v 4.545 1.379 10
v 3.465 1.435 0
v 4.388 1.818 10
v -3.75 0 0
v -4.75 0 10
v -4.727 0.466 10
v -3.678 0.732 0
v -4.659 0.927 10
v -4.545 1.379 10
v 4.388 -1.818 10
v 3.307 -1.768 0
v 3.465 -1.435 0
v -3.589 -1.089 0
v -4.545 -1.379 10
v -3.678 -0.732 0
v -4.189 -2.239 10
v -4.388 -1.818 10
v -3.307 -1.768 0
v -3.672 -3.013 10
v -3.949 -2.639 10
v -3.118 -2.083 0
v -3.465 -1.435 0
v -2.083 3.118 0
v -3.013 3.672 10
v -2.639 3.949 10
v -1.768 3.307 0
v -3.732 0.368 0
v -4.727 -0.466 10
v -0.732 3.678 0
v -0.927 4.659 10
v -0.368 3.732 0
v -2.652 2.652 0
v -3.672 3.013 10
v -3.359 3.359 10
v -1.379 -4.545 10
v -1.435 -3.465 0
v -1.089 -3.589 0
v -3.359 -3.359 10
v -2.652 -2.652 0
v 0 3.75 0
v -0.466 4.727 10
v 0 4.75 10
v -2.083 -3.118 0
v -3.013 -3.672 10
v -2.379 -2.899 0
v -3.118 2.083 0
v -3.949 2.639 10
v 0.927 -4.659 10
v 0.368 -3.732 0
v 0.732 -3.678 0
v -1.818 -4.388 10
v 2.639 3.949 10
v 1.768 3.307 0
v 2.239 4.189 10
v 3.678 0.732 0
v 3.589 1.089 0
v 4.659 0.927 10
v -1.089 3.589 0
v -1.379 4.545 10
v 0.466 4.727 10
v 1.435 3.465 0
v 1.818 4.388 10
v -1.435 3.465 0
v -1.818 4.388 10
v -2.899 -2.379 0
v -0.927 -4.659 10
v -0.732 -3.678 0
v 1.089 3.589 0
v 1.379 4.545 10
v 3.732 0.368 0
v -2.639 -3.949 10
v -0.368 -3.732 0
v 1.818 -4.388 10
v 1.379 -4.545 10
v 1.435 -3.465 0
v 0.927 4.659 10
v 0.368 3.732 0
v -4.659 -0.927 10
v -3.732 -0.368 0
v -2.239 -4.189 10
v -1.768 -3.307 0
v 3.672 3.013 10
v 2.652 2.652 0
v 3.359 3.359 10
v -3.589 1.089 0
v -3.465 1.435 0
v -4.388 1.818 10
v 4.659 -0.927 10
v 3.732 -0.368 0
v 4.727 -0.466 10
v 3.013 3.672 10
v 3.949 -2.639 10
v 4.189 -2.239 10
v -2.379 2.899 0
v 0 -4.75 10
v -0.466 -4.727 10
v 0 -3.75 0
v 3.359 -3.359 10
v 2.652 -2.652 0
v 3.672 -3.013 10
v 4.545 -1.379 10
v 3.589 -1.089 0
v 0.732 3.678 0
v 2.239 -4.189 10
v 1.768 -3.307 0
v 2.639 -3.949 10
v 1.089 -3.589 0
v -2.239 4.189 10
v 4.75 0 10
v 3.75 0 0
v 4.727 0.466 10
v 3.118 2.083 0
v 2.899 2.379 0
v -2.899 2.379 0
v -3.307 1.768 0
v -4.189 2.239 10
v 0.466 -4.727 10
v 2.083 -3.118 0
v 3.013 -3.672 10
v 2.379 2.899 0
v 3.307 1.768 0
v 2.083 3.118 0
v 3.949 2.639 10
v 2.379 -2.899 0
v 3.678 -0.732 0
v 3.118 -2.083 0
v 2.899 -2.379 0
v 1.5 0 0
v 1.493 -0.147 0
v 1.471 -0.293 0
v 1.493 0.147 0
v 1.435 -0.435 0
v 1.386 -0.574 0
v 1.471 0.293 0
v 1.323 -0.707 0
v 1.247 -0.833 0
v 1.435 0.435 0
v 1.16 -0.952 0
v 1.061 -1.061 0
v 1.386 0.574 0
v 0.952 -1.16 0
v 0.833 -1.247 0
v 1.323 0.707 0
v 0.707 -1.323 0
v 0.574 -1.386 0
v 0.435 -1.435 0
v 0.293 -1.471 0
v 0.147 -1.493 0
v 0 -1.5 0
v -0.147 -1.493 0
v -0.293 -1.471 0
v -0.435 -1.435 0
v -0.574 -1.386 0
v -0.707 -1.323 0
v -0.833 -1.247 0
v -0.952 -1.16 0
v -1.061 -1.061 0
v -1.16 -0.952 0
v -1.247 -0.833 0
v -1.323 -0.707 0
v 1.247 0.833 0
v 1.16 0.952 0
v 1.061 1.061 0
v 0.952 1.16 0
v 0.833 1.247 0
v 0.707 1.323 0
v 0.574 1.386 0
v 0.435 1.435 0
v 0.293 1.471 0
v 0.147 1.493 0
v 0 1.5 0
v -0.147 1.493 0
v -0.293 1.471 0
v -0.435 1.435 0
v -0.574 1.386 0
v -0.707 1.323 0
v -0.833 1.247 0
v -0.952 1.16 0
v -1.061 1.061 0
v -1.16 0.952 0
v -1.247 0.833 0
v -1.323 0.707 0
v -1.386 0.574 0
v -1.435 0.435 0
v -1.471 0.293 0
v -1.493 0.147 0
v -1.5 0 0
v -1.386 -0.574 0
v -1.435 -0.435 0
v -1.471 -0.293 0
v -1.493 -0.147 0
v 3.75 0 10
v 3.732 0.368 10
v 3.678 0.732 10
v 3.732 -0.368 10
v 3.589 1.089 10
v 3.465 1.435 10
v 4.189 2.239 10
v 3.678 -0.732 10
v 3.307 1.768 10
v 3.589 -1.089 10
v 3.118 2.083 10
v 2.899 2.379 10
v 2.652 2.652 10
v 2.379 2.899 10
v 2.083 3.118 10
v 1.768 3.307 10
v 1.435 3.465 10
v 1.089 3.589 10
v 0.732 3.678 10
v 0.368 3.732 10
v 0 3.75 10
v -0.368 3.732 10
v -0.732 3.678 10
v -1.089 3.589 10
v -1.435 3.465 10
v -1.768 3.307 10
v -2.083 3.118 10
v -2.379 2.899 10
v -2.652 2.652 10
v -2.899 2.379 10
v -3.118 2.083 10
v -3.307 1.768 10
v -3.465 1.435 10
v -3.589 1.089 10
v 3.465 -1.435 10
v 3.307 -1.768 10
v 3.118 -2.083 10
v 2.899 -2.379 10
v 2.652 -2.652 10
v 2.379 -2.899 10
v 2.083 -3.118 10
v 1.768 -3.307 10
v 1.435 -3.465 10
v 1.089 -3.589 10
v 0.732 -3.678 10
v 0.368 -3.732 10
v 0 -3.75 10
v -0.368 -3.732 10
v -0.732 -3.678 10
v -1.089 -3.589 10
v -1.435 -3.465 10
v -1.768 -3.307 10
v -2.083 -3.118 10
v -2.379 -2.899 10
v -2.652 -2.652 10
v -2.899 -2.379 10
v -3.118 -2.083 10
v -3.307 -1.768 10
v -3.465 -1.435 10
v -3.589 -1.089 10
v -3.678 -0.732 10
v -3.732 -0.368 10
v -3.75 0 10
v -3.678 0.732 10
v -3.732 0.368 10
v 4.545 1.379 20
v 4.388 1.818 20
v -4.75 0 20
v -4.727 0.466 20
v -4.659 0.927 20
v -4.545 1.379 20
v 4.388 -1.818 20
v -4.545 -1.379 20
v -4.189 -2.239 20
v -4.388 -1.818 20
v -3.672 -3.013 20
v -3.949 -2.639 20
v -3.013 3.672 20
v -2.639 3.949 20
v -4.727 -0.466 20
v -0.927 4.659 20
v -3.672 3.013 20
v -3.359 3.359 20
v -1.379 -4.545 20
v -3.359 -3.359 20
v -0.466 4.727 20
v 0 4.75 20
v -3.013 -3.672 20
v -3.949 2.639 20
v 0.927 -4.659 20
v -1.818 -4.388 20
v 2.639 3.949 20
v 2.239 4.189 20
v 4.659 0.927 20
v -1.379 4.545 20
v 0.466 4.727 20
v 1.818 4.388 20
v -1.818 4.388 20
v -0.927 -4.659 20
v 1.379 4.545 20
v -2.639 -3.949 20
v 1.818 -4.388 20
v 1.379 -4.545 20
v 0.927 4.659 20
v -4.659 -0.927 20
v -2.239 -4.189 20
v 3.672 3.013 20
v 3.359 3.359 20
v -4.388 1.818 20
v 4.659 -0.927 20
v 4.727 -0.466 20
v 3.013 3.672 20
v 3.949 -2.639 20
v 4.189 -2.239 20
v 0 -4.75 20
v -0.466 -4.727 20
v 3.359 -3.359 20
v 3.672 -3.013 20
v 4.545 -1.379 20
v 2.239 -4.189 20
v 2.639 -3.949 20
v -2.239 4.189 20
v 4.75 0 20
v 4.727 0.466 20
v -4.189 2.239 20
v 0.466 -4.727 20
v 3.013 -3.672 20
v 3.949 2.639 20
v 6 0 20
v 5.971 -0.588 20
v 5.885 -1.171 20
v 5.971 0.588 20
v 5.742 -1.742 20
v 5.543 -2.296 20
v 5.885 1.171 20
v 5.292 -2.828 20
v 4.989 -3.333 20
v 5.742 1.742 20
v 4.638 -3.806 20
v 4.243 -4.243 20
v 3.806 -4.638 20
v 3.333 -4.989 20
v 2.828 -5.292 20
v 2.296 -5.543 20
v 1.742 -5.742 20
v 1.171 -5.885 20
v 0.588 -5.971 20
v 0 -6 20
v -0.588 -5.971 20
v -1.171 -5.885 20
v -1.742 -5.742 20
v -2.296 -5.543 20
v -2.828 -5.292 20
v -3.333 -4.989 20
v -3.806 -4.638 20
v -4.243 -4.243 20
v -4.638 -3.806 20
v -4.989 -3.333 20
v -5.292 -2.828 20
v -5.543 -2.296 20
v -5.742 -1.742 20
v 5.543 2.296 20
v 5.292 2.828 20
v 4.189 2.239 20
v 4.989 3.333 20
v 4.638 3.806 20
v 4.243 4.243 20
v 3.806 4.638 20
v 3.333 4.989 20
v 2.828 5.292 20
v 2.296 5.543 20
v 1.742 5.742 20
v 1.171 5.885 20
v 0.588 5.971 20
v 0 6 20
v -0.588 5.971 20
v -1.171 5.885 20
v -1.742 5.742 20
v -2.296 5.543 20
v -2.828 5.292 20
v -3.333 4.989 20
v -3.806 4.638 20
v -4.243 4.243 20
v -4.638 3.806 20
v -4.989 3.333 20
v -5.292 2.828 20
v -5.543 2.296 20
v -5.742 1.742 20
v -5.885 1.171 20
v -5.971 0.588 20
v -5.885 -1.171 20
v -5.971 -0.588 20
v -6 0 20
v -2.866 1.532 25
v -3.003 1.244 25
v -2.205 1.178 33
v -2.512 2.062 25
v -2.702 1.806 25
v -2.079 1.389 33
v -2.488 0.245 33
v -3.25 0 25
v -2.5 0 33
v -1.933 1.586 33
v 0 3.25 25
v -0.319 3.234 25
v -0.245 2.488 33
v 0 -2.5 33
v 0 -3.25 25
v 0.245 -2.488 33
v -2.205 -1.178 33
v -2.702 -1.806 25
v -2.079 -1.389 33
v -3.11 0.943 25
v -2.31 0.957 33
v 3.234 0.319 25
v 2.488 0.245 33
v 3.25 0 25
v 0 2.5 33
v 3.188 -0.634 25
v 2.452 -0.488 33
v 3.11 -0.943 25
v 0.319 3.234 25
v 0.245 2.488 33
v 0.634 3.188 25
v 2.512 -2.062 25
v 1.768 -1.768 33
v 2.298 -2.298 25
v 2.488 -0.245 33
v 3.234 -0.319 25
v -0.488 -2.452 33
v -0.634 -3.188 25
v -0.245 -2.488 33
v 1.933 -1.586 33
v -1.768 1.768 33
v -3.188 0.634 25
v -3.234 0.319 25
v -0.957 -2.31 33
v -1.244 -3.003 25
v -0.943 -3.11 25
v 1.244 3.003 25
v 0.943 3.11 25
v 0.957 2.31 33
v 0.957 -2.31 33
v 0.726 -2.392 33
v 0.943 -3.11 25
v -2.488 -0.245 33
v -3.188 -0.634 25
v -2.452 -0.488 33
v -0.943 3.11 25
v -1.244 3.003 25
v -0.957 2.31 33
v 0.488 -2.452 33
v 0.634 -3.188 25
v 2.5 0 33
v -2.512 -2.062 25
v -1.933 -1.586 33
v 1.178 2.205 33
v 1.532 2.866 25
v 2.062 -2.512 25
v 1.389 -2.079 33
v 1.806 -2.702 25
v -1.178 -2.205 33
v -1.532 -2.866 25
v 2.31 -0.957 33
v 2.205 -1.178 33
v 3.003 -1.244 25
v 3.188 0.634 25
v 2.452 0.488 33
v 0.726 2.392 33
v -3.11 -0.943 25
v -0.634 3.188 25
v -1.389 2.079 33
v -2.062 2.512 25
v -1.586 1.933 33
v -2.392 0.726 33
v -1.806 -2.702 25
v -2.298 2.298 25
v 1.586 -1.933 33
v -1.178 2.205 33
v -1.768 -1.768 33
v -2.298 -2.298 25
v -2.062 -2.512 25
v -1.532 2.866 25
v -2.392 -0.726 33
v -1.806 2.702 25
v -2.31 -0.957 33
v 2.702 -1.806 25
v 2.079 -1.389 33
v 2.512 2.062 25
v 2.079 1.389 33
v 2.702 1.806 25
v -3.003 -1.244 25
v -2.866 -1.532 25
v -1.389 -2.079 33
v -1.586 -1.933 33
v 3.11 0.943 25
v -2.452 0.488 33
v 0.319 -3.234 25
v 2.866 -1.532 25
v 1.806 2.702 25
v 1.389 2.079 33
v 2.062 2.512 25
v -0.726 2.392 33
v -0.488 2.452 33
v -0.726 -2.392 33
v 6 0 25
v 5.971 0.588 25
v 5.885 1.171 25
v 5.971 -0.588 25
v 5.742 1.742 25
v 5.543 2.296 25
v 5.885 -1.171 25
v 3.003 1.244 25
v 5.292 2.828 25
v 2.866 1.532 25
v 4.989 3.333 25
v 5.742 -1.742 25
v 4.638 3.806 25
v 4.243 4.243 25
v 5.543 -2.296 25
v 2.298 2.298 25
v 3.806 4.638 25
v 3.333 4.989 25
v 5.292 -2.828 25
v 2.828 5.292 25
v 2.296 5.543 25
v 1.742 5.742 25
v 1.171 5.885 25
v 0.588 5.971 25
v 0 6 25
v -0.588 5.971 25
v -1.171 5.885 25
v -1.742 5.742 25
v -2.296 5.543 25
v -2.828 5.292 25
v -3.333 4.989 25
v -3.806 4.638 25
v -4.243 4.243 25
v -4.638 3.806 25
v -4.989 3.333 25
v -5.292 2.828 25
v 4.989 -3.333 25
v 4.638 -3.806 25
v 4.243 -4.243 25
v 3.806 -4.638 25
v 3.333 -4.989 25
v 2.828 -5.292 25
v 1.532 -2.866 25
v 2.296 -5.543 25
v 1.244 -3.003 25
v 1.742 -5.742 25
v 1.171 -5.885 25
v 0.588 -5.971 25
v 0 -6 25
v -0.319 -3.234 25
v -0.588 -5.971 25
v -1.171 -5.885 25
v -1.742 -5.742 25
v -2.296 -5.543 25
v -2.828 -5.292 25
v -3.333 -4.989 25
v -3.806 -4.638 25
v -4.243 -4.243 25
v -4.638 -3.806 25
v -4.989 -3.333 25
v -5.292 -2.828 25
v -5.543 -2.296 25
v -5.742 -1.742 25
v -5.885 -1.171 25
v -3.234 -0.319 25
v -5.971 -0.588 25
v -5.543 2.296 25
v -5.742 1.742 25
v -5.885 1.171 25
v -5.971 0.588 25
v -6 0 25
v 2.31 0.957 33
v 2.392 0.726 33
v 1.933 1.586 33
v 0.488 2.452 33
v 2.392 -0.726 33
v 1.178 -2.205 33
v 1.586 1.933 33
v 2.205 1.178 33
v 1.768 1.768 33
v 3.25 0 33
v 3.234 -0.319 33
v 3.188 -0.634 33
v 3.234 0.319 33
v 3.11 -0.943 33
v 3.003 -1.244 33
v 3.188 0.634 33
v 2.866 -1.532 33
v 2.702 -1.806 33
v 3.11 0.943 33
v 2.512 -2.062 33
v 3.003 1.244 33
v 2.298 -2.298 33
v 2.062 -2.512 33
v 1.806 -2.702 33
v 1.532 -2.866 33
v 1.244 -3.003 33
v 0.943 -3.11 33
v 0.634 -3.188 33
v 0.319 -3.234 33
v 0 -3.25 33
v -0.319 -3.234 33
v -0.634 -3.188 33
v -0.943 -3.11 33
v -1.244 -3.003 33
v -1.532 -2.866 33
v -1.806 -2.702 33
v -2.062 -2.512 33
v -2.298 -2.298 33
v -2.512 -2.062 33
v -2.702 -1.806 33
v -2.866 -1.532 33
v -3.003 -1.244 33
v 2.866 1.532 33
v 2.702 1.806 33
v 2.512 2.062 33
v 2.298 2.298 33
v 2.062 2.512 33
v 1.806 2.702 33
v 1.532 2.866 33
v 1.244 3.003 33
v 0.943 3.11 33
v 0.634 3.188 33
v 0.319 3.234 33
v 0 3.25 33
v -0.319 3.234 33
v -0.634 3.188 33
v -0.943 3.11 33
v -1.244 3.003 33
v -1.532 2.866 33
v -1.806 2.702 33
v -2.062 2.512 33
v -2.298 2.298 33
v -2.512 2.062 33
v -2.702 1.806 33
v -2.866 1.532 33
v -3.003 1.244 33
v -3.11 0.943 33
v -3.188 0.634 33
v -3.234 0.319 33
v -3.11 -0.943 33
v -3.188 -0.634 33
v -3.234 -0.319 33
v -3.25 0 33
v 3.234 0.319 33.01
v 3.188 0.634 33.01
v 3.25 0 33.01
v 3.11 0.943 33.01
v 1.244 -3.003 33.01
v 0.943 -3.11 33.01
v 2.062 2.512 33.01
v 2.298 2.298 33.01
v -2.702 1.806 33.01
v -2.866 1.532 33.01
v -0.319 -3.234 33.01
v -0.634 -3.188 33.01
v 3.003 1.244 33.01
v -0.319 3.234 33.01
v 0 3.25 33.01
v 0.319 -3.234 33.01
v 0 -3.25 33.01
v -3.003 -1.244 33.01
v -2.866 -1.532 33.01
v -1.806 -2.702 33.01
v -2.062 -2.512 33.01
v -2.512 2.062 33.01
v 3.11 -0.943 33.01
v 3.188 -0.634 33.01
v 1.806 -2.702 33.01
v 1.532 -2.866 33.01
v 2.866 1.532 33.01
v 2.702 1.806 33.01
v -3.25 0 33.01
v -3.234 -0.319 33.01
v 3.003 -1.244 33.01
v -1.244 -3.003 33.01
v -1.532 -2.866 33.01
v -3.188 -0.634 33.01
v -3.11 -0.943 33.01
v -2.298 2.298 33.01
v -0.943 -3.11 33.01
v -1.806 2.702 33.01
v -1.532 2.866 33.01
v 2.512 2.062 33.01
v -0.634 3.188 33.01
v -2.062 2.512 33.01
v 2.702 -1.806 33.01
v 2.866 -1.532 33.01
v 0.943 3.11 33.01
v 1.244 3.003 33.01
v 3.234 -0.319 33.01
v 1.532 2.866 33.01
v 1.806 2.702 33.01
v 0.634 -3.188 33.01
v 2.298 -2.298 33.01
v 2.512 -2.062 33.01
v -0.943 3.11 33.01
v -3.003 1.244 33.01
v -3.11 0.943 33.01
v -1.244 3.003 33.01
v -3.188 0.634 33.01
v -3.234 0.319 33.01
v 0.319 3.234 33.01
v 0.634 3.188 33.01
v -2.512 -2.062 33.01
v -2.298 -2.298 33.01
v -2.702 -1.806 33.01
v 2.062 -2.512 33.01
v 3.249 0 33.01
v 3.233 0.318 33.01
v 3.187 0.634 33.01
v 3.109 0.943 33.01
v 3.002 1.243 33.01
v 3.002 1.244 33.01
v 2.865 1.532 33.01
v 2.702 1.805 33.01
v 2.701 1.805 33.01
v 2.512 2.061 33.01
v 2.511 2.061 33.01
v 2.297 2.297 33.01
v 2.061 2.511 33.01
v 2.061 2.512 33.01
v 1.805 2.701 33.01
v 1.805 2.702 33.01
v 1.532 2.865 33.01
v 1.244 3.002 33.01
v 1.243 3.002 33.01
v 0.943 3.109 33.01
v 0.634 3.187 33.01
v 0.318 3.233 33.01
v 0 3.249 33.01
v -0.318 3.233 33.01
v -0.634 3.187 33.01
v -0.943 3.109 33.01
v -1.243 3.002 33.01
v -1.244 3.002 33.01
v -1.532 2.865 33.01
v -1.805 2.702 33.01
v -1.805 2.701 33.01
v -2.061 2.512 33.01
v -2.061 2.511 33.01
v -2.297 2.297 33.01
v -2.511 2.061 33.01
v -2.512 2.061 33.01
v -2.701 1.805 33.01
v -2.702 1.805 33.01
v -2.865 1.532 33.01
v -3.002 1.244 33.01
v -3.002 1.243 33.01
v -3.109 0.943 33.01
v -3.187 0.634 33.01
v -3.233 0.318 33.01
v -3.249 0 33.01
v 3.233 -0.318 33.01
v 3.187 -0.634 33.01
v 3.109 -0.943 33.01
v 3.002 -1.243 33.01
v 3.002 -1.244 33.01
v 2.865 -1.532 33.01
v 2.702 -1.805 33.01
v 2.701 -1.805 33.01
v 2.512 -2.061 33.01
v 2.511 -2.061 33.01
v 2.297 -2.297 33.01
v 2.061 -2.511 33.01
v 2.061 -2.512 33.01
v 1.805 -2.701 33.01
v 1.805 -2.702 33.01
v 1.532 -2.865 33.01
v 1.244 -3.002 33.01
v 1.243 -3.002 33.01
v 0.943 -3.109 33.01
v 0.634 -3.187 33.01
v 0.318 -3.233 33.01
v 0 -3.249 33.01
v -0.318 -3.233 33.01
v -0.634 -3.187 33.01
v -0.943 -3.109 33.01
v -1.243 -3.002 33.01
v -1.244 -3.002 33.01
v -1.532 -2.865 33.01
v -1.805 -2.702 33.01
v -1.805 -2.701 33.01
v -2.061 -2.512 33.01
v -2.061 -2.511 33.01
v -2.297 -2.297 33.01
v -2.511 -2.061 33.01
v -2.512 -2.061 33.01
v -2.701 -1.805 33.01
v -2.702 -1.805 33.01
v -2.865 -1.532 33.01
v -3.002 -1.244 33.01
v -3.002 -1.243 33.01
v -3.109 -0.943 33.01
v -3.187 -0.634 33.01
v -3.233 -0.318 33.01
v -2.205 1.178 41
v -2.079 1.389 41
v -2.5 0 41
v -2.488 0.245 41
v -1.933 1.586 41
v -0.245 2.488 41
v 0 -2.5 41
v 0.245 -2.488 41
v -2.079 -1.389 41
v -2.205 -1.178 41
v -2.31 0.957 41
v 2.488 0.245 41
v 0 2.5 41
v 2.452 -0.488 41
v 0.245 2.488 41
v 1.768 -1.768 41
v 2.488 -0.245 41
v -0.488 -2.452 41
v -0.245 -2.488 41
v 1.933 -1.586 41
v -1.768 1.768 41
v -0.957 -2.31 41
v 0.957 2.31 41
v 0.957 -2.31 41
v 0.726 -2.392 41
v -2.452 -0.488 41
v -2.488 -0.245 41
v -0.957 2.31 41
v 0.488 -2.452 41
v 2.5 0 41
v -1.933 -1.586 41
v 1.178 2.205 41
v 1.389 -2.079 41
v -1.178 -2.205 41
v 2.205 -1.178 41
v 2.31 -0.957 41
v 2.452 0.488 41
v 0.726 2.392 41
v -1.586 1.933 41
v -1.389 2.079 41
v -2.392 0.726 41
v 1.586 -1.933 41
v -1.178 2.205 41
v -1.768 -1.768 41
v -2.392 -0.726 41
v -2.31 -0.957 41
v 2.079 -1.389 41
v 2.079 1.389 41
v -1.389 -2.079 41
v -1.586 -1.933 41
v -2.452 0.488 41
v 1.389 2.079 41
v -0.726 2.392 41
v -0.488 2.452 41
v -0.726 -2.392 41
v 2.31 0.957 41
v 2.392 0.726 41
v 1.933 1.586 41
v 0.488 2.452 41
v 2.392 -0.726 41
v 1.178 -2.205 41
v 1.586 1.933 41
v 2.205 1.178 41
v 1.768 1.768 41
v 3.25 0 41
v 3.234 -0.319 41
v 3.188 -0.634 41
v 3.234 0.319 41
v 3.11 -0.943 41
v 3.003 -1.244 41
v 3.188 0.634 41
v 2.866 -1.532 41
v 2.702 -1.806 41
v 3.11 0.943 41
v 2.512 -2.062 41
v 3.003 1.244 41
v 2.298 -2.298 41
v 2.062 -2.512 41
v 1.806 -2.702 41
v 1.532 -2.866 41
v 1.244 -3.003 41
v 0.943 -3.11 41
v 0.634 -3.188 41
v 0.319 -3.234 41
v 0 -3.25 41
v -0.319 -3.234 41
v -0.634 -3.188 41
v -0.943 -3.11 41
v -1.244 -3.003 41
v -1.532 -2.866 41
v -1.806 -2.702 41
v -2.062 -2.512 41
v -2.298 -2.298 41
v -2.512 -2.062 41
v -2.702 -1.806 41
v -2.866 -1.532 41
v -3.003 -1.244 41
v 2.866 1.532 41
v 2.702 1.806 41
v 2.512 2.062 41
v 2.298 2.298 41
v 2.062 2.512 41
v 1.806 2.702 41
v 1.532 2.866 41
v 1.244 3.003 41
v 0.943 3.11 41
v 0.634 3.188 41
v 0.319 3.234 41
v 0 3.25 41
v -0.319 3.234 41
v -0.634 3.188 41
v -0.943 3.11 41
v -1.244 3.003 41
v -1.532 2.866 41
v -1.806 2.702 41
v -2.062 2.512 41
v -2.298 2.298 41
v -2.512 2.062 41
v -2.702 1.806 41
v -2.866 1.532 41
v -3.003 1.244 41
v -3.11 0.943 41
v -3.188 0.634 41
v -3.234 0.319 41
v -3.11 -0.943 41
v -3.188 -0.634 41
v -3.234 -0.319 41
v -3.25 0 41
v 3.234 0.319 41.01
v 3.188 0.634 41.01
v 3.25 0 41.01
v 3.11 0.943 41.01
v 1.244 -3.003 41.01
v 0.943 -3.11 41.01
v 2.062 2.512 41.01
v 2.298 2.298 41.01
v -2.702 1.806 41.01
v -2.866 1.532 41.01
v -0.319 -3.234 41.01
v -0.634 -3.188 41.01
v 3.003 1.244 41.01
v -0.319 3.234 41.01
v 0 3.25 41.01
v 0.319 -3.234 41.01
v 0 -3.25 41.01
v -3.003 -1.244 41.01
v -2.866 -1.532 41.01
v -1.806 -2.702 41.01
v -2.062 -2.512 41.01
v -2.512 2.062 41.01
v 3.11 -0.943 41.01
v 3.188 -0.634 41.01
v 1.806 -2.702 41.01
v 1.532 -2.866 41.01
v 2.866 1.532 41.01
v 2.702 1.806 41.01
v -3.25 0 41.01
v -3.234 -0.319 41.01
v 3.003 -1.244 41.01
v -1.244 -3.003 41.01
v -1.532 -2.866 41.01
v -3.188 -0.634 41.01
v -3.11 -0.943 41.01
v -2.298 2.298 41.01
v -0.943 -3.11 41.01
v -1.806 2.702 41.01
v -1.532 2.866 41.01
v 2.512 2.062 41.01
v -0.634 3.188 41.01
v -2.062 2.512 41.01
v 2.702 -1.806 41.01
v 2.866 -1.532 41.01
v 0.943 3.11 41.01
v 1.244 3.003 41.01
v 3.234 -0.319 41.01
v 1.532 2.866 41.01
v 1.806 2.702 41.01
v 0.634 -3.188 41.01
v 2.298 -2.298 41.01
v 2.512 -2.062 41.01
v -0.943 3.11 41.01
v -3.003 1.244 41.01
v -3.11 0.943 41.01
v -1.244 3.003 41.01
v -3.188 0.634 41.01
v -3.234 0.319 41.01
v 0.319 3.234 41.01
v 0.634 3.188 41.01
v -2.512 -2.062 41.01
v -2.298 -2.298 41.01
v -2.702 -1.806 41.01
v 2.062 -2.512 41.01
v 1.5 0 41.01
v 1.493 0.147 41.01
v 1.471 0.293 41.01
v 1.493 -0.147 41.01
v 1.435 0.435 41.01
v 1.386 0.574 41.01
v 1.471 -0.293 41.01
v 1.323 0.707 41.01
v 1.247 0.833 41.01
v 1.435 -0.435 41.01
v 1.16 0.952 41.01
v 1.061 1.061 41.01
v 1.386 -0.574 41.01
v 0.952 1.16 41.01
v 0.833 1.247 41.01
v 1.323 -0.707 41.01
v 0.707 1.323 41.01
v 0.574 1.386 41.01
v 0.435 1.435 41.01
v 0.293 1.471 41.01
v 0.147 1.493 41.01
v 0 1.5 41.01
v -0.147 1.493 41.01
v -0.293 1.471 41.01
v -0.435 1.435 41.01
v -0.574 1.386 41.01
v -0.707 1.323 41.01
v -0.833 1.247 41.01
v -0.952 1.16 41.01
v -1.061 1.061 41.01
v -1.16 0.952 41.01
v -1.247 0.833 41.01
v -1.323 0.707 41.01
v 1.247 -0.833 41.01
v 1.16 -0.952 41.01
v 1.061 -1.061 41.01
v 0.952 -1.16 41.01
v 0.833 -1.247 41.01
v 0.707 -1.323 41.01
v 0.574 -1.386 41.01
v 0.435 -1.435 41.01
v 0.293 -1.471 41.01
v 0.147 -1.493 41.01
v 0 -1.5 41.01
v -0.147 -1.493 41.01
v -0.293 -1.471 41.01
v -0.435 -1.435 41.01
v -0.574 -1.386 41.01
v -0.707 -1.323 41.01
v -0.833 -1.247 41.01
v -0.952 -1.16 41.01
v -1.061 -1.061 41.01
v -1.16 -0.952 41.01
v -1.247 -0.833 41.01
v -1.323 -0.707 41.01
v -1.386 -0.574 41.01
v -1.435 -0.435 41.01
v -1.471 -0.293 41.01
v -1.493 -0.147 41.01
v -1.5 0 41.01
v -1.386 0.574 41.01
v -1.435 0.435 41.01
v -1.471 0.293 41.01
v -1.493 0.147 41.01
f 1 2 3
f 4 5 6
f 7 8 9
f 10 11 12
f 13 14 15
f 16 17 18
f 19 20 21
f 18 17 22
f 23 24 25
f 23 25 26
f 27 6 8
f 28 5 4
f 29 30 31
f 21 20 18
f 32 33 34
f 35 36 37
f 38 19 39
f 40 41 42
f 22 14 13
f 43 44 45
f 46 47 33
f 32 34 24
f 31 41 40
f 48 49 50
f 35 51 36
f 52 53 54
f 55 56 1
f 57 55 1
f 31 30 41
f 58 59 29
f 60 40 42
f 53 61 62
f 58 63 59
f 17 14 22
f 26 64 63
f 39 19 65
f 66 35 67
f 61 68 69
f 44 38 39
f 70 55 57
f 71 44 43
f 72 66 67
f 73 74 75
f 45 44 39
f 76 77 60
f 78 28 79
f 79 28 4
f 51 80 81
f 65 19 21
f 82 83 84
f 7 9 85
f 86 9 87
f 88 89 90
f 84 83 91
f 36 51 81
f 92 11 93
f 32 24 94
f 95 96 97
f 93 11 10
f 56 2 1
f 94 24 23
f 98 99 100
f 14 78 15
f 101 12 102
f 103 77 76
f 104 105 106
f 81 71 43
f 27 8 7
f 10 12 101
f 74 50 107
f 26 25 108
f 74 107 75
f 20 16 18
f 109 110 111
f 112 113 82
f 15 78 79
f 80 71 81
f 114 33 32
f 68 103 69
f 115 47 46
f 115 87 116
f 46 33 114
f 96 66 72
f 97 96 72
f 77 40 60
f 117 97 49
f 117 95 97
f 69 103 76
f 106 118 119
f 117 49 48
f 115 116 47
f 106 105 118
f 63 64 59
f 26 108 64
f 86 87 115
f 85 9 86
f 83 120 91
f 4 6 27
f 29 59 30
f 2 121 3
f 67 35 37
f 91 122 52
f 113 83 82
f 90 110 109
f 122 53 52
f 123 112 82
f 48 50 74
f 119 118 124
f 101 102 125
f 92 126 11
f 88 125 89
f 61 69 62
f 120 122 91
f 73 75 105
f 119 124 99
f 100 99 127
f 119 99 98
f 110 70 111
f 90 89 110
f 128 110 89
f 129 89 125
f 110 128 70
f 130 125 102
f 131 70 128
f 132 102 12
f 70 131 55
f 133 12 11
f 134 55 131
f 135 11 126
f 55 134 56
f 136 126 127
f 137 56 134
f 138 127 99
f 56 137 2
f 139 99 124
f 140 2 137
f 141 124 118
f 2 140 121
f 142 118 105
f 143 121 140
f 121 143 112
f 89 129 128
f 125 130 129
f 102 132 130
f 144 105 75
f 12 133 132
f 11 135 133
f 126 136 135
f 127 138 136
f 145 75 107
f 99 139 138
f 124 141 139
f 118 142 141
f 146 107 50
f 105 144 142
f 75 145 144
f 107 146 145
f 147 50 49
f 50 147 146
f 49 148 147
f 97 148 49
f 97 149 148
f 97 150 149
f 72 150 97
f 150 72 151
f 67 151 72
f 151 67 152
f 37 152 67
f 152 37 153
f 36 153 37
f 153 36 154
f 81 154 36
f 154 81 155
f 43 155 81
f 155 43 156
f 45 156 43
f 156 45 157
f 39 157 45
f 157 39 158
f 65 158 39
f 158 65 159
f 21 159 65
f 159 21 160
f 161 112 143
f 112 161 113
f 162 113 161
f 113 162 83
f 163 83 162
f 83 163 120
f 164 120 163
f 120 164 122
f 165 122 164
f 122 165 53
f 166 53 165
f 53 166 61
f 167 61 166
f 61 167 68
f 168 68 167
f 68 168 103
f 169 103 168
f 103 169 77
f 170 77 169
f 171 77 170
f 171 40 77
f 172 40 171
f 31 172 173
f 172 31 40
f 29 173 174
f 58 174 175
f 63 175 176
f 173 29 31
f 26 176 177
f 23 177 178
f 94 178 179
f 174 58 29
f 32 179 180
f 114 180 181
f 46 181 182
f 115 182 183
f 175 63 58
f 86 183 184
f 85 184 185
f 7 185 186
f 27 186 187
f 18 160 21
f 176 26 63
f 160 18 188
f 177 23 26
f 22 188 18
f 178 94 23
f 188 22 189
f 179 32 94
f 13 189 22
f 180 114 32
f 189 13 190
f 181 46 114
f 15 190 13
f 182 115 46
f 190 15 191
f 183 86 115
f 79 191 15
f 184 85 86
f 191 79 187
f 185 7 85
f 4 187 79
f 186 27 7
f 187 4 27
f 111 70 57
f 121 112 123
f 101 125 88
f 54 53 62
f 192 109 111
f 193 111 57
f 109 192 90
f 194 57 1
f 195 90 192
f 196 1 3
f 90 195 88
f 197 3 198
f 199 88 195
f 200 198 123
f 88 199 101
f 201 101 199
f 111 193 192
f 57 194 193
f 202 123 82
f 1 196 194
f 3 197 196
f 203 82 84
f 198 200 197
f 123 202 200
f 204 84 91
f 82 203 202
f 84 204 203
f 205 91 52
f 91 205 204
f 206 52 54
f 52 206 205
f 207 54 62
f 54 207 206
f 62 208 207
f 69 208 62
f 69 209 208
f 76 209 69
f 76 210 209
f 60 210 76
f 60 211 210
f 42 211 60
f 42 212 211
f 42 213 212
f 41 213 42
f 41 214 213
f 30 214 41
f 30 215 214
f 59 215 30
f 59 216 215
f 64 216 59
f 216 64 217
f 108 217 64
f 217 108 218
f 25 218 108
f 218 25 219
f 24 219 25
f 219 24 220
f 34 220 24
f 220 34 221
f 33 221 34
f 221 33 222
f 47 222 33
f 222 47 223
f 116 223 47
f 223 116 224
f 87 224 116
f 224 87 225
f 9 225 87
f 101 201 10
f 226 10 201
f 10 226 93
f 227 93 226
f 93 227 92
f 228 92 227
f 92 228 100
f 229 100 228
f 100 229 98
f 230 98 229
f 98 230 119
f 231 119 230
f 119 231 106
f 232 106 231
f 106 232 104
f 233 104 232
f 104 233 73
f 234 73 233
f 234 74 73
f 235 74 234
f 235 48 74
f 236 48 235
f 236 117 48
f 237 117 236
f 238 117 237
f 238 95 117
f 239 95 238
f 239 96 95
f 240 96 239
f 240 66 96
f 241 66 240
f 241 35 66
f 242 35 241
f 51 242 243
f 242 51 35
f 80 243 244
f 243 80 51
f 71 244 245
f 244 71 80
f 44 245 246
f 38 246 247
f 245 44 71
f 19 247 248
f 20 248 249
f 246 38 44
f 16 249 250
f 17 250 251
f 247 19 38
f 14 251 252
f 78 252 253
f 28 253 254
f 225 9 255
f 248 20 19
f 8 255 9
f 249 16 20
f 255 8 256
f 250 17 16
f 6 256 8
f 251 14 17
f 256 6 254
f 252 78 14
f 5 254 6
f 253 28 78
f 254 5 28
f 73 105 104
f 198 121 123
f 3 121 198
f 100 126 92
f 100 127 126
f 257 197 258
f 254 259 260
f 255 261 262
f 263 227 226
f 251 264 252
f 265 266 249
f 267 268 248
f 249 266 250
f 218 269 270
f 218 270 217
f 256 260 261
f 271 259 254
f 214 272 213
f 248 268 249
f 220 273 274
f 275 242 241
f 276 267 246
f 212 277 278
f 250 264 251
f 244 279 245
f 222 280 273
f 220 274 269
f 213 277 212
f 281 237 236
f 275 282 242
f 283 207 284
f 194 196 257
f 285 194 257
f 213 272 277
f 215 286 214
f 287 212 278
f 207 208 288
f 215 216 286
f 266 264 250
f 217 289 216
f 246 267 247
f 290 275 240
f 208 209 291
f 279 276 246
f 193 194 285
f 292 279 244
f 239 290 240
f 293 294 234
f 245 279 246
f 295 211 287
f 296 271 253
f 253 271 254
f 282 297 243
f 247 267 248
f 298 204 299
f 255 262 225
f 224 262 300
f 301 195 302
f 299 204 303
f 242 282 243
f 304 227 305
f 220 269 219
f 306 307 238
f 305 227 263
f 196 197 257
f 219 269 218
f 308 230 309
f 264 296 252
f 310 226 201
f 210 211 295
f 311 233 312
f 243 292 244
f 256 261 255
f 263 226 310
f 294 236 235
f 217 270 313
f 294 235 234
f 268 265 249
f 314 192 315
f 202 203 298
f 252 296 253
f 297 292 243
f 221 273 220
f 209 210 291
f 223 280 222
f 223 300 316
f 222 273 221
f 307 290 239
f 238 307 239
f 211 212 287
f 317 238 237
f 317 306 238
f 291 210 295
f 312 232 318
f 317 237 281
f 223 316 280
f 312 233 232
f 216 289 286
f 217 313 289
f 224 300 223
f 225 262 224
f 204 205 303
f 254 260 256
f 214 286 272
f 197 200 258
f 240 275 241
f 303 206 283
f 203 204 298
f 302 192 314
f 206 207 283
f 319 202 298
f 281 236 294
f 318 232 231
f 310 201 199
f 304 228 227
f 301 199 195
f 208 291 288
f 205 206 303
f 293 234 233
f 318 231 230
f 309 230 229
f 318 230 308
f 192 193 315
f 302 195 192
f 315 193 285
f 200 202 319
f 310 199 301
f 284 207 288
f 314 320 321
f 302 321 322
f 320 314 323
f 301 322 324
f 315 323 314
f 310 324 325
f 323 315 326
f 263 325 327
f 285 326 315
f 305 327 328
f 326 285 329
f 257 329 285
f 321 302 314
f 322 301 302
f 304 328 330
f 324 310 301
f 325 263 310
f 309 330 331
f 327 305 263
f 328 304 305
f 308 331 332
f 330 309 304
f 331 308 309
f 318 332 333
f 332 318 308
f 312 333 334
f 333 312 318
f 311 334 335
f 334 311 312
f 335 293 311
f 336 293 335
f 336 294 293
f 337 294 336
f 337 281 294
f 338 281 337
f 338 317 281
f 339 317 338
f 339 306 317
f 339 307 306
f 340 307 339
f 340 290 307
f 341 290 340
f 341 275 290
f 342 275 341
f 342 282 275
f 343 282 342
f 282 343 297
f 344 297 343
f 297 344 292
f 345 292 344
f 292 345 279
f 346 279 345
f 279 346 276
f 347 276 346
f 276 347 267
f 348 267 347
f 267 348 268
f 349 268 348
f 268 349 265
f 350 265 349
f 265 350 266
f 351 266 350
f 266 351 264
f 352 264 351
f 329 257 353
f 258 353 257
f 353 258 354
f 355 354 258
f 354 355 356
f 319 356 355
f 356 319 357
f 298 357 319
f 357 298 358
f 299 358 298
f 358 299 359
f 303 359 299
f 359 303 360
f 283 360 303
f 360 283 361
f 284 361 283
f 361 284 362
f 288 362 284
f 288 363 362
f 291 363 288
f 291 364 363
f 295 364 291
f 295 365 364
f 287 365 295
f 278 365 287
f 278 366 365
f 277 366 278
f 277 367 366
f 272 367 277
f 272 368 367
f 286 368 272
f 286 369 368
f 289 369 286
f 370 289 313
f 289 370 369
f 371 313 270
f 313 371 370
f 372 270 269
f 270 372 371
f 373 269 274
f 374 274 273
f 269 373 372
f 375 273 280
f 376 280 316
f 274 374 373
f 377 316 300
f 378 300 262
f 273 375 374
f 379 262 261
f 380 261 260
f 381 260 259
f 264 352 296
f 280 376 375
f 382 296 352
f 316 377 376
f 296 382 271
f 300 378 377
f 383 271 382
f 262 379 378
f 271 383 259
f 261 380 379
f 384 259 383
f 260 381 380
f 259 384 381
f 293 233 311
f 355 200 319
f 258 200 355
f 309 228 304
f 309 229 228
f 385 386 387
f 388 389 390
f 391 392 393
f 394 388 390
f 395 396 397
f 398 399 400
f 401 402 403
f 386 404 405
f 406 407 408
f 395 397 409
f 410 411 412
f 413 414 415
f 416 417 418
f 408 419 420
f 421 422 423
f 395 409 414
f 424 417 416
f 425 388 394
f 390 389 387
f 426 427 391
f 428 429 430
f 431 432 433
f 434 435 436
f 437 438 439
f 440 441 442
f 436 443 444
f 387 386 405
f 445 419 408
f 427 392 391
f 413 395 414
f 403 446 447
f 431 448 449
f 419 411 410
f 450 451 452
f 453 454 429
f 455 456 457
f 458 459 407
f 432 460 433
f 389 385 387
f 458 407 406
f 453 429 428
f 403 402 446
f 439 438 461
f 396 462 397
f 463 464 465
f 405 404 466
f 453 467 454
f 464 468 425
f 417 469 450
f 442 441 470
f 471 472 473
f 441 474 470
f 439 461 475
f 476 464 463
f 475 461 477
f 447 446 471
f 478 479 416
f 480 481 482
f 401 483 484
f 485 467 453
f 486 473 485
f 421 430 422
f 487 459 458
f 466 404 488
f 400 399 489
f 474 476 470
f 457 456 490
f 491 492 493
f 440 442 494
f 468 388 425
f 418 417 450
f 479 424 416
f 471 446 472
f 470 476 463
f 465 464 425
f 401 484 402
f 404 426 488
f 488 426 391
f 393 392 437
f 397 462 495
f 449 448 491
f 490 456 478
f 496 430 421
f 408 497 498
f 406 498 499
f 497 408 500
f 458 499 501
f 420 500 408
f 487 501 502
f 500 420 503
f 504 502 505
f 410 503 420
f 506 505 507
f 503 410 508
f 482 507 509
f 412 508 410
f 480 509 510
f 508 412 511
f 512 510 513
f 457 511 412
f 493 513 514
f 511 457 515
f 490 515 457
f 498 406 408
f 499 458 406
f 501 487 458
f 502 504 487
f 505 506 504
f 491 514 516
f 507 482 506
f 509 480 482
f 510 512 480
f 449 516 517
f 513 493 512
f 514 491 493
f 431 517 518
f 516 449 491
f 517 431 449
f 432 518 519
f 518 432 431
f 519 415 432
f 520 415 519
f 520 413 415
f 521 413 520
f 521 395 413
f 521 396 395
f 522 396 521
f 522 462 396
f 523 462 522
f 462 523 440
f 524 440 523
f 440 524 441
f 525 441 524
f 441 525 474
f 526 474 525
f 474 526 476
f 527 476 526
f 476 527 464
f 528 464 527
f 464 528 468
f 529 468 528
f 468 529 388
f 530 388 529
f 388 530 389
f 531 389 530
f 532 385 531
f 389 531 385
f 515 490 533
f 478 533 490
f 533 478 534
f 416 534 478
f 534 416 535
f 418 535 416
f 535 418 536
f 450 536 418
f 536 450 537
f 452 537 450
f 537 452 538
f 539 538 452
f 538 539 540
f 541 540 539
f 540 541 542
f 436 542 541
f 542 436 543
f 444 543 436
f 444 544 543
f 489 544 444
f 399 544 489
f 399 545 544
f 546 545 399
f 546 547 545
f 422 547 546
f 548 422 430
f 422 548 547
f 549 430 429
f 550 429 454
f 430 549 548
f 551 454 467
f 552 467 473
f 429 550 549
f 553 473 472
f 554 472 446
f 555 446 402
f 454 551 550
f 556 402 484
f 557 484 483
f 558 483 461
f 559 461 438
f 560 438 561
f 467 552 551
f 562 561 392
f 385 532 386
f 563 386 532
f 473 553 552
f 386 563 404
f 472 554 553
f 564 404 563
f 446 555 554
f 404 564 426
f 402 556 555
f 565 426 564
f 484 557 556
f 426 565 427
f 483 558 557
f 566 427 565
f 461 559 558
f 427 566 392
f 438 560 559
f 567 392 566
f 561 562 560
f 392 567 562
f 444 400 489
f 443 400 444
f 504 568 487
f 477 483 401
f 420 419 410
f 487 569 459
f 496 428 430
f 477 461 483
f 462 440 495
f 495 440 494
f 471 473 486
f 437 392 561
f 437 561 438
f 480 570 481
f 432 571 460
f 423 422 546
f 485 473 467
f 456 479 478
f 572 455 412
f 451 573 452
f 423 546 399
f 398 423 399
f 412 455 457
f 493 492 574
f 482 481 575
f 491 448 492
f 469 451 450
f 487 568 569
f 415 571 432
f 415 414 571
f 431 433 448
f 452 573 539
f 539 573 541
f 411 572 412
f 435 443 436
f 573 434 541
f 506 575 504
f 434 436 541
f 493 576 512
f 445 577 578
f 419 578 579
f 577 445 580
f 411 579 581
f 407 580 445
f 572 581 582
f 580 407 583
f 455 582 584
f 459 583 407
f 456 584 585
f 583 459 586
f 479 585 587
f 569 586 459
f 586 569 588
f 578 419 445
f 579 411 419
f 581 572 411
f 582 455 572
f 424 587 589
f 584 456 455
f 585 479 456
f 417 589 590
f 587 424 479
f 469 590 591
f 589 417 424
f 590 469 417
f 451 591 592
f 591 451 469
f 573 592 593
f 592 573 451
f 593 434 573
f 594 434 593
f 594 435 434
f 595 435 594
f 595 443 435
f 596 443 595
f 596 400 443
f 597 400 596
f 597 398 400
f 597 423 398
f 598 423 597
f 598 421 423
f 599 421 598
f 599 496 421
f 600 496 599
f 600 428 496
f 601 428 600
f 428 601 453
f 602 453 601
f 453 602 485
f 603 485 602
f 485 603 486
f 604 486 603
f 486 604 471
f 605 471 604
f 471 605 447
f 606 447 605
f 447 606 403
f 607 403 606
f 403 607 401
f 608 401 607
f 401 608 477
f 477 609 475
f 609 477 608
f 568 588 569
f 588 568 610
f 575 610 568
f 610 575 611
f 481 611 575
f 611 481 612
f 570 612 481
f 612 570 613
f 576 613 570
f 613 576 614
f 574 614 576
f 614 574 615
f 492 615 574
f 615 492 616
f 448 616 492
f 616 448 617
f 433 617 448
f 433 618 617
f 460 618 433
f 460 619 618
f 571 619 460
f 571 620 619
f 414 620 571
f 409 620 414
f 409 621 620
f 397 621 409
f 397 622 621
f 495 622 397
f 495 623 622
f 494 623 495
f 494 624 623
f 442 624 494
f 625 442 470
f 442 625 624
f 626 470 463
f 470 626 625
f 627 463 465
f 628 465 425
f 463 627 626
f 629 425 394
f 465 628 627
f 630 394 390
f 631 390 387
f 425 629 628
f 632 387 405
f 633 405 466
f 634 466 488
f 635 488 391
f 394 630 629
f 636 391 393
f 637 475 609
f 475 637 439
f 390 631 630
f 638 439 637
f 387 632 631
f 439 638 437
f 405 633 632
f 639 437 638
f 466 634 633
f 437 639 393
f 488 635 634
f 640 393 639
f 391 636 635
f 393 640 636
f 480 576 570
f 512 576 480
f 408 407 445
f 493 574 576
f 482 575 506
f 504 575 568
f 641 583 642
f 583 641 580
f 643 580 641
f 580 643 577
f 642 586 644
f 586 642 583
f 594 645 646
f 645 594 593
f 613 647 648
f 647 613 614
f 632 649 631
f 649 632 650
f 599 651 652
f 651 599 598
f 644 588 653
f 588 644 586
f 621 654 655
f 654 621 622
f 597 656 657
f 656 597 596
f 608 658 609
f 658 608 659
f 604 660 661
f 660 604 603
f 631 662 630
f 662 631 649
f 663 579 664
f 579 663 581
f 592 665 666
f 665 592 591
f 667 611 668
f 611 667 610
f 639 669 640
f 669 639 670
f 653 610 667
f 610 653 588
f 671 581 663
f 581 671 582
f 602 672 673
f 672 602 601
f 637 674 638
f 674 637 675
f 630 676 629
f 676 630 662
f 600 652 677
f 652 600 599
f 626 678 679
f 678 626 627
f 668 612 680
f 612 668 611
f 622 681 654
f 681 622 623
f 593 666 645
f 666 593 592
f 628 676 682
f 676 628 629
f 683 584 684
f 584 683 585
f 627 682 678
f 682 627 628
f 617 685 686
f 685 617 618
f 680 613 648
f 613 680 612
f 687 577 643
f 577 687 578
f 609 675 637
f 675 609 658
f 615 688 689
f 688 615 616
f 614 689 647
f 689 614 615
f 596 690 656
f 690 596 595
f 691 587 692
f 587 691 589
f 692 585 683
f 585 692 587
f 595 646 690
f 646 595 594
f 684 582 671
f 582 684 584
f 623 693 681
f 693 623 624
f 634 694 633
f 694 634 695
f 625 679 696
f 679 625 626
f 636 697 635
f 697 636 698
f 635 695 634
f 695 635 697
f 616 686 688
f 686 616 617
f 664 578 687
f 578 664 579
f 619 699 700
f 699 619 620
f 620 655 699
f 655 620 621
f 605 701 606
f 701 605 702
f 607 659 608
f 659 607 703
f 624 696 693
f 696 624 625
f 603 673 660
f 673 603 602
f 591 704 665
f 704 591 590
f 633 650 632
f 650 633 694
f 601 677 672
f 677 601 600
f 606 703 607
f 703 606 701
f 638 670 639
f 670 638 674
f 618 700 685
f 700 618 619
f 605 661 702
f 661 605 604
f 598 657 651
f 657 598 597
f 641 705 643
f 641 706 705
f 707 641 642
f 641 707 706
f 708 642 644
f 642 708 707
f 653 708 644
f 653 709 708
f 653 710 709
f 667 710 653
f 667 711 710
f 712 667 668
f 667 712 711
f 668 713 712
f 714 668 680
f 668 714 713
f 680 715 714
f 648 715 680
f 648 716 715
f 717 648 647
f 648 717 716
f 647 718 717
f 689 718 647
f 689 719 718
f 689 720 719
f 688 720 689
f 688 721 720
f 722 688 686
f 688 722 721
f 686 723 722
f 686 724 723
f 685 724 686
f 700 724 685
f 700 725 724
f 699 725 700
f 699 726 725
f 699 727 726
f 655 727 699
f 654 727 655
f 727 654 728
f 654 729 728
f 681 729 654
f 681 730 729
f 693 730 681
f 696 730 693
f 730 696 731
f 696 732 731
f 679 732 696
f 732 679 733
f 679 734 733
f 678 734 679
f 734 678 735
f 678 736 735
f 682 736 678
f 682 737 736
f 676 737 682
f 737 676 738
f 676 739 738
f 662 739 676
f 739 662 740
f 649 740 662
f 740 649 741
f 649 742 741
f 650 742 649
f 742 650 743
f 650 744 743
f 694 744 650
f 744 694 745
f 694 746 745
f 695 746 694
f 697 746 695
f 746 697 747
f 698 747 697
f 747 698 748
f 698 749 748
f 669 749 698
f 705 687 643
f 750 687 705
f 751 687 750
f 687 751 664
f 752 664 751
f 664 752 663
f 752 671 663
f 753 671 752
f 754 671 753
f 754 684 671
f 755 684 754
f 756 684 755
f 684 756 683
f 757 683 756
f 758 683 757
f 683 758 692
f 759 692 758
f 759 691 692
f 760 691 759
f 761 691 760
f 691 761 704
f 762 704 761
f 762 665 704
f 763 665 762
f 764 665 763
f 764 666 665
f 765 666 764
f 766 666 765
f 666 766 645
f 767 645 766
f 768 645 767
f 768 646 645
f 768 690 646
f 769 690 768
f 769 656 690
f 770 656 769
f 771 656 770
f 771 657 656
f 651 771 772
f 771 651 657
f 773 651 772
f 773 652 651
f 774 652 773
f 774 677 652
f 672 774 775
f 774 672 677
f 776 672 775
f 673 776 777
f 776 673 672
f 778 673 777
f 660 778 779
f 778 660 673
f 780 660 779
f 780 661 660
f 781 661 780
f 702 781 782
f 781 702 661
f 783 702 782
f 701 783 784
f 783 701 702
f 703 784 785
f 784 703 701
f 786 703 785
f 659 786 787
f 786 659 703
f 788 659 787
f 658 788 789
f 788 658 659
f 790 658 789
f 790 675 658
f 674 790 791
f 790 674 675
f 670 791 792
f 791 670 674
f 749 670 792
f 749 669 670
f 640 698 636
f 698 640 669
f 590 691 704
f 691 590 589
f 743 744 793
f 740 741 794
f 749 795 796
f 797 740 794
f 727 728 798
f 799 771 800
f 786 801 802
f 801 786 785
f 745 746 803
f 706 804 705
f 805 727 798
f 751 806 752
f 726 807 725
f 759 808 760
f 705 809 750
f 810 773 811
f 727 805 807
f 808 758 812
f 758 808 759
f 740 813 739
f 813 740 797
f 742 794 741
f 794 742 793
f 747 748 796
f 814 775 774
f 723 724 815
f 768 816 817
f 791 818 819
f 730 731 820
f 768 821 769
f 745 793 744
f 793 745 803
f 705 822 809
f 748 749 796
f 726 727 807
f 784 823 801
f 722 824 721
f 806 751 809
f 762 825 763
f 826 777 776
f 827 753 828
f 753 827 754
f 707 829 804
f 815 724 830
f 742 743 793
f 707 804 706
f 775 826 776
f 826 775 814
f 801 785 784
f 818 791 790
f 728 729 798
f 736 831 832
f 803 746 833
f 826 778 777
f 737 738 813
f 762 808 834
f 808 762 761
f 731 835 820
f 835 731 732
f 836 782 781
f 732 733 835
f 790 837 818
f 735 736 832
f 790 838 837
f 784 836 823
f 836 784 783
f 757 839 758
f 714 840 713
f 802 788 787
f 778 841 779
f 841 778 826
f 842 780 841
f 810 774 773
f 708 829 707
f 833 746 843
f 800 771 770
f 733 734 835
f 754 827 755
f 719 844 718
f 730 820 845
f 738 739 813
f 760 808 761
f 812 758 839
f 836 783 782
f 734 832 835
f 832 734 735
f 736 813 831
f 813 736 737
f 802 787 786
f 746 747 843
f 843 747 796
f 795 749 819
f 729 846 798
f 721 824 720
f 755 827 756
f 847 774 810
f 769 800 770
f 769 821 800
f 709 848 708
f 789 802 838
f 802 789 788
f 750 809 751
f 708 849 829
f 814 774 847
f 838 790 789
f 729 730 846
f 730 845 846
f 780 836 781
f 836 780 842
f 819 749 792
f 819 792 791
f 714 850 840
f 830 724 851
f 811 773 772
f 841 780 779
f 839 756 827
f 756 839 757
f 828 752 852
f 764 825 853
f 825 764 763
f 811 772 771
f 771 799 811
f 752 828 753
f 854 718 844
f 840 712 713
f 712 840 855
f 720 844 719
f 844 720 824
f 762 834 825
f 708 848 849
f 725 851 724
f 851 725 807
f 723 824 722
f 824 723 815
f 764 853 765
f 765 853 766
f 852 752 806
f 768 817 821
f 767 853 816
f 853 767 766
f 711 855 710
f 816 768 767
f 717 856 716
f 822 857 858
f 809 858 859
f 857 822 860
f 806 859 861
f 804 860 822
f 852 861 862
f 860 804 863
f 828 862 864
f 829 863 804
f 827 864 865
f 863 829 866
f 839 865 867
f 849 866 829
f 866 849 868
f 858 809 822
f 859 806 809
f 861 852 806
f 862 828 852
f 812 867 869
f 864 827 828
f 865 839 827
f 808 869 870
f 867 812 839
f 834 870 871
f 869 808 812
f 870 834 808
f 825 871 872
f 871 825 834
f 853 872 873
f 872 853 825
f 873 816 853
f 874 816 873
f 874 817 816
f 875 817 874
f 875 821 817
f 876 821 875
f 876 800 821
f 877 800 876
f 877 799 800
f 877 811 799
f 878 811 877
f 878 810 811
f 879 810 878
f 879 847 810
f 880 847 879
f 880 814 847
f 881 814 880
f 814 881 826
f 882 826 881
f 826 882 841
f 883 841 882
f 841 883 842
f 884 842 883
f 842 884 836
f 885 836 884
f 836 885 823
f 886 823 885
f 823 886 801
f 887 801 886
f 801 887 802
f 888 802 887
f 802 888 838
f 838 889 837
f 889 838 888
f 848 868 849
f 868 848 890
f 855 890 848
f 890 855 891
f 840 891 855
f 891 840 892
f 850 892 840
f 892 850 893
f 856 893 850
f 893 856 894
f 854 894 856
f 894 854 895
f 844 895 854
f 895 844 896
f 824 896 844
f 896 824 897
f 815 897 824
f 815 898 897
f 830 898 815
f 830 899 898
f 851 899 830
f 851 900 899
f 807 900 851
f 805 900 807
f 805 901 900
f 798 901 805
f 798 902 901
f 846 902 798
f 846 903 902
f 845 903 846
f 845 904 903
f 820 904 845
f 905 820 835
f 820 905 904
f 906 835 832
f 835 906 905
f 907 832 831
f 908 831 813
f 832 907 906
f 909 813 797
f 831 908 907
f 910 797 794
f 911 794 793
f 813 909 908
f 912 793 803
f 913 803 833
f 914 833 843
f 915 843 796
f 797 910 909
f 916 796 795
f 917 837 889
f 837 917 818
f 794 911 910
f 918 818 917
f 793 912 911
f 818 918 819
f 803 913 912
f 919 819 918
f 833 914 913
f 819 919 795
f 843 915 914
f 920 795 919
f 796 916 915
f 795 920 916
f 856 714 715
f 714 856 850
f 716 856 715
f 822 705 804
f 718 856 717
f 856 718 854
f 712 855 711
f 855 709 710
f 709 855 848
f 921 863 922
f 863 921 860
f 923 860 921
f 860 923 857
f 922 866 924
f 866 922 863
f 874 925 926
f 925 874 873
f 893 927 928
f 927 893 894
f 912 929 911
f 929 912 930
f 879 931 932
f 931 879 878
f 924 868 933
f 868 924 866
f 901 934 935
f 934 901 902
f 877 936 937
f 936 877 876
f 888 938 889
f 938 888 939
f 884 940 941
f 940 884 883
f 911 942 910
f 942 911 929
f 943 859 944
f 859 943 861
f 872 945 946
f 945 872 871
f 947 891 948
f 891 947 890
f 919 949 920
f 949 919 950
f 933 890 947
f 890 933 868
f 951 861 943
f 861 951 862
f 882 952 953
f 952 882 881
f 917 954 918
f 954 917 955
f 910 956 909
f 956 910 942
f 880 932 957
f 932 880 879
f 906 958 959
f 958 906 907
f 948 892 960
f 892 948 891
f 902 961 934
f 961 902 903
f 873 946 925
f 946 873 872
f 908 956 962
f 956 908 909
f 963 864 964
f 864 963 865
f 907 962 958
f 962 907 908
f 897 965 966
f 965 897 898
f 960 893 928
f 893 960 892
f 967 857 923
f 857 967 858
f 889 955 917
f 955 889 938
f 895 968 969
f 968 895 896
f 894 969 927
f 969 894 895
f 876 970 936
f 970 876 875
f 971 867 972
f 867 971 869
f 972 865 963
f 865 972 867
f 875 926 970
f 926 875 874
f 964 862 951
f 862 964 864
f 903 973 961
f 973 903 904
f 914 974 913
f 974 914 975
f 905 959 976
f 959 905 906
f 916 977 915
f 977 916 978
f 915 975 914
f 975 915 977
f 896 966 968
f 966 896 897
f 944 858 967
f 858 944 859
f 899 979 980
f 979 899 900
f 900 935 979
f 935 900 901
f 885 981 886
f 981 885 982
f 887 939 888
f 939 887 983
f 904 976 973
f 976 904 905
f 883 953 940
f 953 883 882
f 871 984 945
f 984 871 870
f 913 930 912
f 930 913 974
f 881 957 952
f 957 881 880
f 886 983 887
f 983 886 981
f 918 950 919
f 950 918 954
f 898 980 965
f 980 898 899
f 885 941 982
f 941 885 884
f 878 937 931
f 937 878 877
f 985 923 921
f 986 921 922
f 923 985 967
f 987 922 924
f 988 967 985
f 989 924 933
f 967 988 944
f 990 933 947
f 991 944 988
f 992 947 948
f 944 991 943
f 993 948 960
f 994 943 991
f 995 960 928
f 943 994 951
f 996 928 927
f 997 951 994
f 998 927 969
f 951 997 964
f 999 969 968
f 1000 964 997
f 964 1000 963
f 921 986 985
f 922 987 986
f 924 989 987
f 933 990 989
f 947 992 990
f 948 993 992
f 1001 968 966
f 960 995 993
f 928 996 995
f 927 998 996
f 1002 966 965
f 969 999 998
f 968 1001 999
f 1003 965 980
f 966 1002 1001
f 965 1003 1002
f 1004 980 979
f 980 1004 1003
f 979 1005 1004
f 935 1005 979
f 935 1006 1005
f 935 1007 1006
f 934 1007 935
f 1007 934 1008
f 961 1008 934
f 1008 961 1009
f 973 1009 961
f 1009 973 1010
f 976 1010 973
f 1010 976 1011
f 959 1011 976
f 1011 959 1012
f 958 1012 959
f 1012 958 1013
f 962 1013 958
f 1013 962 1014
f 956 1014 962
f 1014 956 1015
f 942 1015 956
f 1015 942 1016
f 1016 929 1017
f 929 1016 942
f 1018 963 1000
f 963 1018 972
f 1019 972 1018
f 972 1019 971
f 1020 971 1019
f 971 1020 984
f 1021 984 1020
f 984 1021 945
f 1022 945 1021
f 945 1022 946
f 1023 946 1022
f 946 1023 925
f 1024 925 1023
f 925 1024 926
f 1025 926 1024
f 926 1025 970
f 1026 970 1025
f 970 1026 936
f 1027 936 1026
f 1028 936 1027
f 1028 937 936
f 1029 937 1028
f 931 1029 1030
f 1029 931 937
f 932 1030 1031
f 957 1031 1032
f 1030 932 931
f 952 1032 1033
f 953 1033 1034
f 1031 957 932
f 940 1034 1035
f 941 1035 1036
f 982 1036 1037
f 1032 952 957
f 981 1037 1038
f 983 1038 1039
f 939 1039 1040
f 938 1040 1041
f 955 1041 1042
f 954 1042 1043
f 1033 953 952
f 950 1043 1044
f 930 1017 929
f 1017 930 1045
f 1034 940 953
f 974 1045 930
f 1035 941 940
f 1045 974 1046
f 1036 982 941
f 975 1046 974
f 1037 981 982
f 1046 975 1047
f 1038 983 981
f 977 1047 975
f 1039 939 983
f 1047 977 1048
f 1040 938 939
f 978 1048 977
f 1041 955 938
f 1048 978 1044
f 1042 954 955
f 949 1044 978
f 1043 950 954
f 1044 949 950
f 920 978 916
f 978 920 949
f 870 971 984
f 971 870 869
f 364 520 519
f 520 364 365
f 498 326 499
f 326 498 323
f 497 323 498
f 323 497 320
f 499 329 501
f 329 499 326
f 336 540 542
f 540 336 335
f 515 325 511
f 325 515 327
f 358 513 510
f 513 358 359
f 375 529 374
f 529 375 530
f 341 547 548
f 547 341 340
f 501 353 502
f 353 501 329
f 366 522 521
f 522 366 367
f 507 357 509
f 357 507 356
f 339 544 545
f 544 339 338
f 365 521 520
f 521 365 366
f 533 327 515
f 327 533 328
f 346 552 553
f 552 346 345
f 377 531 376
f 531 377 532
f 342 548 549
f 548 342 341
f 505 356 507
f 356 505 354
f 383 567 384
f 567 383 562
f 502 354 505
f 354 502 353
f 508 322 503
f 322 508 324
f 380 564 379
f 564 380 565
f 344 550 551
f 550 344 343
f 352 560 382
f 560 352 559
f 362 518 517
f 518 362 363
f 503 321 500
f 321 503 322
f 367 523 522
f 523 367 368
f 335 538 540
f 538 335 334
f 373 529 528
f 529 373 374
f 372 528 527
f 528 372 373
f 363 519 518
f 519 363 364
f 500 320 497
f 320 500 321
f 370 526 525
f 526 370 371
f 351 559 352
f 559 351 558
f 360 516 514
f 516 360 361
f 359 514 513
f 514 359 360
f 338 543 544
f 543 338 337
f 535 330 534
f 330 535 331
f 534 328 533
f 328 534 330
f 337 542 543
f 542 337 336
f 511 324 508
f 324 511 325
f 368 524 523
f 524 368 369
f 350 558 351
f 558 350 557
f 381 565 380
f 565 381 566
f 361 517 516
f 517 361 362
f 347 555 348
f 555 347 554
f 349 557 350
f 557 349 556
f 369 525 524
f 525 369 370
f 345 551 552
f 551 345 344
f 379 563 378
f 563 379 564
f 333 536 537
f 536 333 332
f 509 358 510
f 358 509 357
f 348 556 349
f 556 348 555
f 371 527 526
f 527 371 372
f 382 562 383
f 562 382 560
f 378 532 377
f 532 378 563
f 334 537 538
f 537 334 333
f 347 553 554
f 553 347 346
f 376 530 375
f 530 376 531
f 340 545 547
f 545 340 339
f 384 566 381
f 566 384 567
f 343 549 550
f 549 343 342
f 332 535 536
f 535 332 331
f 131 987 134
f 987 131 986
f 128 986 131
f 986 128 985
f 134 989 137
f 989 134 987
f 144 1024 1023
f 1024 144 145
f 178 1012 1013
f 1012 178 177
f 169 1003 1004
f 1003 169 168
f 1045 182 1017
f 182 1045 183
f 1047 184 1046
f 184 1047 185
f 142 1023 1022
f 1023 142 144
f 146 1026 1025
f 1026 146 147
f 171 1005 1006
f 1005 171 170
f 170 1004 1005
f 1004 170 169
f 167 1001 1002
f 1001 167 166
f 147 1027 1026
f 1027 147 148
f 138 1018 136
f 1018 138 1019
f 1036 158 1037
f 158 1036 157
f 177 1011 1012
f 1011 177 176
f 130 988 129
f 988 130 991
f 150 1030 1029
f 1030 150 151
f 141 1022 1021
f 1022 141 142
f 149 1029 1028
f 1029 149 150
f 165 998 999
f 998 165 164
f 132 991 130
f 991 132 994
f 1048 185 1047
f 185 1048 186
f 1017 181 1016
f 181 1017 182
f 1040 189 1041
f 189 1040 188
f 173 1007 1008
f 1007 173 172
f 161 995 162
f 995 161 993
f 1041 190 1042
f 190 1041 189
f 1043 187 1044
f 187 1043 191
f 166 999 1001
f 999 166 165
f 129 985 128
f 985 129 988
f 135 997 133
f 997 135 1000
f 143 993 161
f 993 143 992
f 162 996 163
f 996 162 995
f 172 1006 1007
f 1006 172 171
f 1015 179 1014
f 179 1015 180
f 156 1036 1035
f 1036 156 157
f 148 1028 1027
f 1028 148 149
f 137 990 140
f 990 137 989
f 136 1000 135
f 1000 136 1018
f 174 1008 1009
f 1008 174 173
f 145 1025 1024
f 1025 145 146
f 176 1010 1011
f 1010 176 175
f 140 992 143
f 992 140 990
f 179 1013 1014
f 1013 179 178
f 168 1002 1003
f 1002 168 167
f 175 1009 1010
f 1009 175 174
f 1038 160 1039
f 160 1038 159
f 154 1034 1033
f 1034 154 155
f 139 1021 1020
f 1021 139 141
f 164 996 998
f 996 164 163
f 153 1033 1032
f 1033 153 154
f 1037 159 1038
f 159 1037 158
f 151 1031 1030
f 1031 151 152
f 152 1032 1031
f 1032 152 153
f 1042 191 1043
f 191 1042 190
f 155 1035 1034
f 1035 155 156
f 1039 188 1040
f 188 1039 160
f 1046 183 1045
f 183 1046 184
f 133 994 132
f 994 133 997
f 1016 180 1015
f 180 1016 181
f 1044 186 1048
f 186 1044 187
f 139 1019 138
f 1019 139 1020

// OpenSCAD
// Hose-barb reducer: 8 mm ID -> 5 mm ID silicone tubing
// Printed upright, rotationally symmetric about Z, 3 mm through-bore.

$fn = 64;

// Bore
bore_d = 3.0;

// 8 mm tubing section (z = 0..20)
big_barb_h   = 10.0;   // height of each 8 mm barb
big_barb_bot =  7.5;   // outer diameter at barb bottom (mm)
big_barb_top =  9.5;   // outer diameter at barb top (mm)
big_n        =  2;     // number of 8 mm barbs

// Collar (z = 20..25)
collar_h = 5.0;
collar_d = 12.0;

// 5 mm tubing section (z = 25..41)
small_barb_h   =  8.0;  // height of each 5 mm barb
small_barb_bot =  6.5;  // outer diameter at barb bottom (mm)
small_barb_top =  5.0;  // outer diameter at barb top (mm)
small_n        =  2;    // number of 5 mm barbs

// Sawtooth barb: cone from base_d to tip_d over height h, then a straight
// step back to base_d. The step is modelled as a short cylinder (0.01 mm)
// so the sawtooth is preserved and the profile is continuous.
module barb(base_d, tip_d, h) {
    union() {
        // Cone: base radius at z=0, tip radius at z=h
        rotate_extrude()
            polygon([
                [0, 0],
                [base_d / 2, 0],
                [tip_d / 2, h],
                [0, h]
            ]);
        // Step back to base_d (0.01 mm tall, sits on top of the cone)
        translate([0, 0, h])
            cylinder(h = 0.01, d = base_d);
    }
}

// Full outer body: two 8 mm barbs, collar, two 5 mm barbs
module body() {
    union() {
        // 8 mm barbs (z = 0..20)
        for (i = [0 : big_n - 1])
            translate([0, 0, i * big_barb_h])
                barb(big_barb_bot, big_barb_top, big_barb_h);

        // Collar (z = 20..25)
        translate([0, 0, big_n * big_barb_h])
            cylinder(h = collar_h, d = collar_d);

        // 5 mm barbs (z = 25..41)
        for (i = [0 : small_n - 1])
            translate([0, 0, big_n * big_barb_h + collar_h + i * small_barb_h])
                barb(small_barb_bot, small_barb_top, small_barb_h);
    }
}

// Through-bore: 3 mm diameter, extended 1 mm past each face
module bore() {
    cylinder(
        h = big_n * big_barb_h + collar_h + small_n * small_barb_h + 2,
        d = bore_d,
        $fn = $fn
    );
}

// Final part: body minus bore
difference() {
    body();
    bore();
}
